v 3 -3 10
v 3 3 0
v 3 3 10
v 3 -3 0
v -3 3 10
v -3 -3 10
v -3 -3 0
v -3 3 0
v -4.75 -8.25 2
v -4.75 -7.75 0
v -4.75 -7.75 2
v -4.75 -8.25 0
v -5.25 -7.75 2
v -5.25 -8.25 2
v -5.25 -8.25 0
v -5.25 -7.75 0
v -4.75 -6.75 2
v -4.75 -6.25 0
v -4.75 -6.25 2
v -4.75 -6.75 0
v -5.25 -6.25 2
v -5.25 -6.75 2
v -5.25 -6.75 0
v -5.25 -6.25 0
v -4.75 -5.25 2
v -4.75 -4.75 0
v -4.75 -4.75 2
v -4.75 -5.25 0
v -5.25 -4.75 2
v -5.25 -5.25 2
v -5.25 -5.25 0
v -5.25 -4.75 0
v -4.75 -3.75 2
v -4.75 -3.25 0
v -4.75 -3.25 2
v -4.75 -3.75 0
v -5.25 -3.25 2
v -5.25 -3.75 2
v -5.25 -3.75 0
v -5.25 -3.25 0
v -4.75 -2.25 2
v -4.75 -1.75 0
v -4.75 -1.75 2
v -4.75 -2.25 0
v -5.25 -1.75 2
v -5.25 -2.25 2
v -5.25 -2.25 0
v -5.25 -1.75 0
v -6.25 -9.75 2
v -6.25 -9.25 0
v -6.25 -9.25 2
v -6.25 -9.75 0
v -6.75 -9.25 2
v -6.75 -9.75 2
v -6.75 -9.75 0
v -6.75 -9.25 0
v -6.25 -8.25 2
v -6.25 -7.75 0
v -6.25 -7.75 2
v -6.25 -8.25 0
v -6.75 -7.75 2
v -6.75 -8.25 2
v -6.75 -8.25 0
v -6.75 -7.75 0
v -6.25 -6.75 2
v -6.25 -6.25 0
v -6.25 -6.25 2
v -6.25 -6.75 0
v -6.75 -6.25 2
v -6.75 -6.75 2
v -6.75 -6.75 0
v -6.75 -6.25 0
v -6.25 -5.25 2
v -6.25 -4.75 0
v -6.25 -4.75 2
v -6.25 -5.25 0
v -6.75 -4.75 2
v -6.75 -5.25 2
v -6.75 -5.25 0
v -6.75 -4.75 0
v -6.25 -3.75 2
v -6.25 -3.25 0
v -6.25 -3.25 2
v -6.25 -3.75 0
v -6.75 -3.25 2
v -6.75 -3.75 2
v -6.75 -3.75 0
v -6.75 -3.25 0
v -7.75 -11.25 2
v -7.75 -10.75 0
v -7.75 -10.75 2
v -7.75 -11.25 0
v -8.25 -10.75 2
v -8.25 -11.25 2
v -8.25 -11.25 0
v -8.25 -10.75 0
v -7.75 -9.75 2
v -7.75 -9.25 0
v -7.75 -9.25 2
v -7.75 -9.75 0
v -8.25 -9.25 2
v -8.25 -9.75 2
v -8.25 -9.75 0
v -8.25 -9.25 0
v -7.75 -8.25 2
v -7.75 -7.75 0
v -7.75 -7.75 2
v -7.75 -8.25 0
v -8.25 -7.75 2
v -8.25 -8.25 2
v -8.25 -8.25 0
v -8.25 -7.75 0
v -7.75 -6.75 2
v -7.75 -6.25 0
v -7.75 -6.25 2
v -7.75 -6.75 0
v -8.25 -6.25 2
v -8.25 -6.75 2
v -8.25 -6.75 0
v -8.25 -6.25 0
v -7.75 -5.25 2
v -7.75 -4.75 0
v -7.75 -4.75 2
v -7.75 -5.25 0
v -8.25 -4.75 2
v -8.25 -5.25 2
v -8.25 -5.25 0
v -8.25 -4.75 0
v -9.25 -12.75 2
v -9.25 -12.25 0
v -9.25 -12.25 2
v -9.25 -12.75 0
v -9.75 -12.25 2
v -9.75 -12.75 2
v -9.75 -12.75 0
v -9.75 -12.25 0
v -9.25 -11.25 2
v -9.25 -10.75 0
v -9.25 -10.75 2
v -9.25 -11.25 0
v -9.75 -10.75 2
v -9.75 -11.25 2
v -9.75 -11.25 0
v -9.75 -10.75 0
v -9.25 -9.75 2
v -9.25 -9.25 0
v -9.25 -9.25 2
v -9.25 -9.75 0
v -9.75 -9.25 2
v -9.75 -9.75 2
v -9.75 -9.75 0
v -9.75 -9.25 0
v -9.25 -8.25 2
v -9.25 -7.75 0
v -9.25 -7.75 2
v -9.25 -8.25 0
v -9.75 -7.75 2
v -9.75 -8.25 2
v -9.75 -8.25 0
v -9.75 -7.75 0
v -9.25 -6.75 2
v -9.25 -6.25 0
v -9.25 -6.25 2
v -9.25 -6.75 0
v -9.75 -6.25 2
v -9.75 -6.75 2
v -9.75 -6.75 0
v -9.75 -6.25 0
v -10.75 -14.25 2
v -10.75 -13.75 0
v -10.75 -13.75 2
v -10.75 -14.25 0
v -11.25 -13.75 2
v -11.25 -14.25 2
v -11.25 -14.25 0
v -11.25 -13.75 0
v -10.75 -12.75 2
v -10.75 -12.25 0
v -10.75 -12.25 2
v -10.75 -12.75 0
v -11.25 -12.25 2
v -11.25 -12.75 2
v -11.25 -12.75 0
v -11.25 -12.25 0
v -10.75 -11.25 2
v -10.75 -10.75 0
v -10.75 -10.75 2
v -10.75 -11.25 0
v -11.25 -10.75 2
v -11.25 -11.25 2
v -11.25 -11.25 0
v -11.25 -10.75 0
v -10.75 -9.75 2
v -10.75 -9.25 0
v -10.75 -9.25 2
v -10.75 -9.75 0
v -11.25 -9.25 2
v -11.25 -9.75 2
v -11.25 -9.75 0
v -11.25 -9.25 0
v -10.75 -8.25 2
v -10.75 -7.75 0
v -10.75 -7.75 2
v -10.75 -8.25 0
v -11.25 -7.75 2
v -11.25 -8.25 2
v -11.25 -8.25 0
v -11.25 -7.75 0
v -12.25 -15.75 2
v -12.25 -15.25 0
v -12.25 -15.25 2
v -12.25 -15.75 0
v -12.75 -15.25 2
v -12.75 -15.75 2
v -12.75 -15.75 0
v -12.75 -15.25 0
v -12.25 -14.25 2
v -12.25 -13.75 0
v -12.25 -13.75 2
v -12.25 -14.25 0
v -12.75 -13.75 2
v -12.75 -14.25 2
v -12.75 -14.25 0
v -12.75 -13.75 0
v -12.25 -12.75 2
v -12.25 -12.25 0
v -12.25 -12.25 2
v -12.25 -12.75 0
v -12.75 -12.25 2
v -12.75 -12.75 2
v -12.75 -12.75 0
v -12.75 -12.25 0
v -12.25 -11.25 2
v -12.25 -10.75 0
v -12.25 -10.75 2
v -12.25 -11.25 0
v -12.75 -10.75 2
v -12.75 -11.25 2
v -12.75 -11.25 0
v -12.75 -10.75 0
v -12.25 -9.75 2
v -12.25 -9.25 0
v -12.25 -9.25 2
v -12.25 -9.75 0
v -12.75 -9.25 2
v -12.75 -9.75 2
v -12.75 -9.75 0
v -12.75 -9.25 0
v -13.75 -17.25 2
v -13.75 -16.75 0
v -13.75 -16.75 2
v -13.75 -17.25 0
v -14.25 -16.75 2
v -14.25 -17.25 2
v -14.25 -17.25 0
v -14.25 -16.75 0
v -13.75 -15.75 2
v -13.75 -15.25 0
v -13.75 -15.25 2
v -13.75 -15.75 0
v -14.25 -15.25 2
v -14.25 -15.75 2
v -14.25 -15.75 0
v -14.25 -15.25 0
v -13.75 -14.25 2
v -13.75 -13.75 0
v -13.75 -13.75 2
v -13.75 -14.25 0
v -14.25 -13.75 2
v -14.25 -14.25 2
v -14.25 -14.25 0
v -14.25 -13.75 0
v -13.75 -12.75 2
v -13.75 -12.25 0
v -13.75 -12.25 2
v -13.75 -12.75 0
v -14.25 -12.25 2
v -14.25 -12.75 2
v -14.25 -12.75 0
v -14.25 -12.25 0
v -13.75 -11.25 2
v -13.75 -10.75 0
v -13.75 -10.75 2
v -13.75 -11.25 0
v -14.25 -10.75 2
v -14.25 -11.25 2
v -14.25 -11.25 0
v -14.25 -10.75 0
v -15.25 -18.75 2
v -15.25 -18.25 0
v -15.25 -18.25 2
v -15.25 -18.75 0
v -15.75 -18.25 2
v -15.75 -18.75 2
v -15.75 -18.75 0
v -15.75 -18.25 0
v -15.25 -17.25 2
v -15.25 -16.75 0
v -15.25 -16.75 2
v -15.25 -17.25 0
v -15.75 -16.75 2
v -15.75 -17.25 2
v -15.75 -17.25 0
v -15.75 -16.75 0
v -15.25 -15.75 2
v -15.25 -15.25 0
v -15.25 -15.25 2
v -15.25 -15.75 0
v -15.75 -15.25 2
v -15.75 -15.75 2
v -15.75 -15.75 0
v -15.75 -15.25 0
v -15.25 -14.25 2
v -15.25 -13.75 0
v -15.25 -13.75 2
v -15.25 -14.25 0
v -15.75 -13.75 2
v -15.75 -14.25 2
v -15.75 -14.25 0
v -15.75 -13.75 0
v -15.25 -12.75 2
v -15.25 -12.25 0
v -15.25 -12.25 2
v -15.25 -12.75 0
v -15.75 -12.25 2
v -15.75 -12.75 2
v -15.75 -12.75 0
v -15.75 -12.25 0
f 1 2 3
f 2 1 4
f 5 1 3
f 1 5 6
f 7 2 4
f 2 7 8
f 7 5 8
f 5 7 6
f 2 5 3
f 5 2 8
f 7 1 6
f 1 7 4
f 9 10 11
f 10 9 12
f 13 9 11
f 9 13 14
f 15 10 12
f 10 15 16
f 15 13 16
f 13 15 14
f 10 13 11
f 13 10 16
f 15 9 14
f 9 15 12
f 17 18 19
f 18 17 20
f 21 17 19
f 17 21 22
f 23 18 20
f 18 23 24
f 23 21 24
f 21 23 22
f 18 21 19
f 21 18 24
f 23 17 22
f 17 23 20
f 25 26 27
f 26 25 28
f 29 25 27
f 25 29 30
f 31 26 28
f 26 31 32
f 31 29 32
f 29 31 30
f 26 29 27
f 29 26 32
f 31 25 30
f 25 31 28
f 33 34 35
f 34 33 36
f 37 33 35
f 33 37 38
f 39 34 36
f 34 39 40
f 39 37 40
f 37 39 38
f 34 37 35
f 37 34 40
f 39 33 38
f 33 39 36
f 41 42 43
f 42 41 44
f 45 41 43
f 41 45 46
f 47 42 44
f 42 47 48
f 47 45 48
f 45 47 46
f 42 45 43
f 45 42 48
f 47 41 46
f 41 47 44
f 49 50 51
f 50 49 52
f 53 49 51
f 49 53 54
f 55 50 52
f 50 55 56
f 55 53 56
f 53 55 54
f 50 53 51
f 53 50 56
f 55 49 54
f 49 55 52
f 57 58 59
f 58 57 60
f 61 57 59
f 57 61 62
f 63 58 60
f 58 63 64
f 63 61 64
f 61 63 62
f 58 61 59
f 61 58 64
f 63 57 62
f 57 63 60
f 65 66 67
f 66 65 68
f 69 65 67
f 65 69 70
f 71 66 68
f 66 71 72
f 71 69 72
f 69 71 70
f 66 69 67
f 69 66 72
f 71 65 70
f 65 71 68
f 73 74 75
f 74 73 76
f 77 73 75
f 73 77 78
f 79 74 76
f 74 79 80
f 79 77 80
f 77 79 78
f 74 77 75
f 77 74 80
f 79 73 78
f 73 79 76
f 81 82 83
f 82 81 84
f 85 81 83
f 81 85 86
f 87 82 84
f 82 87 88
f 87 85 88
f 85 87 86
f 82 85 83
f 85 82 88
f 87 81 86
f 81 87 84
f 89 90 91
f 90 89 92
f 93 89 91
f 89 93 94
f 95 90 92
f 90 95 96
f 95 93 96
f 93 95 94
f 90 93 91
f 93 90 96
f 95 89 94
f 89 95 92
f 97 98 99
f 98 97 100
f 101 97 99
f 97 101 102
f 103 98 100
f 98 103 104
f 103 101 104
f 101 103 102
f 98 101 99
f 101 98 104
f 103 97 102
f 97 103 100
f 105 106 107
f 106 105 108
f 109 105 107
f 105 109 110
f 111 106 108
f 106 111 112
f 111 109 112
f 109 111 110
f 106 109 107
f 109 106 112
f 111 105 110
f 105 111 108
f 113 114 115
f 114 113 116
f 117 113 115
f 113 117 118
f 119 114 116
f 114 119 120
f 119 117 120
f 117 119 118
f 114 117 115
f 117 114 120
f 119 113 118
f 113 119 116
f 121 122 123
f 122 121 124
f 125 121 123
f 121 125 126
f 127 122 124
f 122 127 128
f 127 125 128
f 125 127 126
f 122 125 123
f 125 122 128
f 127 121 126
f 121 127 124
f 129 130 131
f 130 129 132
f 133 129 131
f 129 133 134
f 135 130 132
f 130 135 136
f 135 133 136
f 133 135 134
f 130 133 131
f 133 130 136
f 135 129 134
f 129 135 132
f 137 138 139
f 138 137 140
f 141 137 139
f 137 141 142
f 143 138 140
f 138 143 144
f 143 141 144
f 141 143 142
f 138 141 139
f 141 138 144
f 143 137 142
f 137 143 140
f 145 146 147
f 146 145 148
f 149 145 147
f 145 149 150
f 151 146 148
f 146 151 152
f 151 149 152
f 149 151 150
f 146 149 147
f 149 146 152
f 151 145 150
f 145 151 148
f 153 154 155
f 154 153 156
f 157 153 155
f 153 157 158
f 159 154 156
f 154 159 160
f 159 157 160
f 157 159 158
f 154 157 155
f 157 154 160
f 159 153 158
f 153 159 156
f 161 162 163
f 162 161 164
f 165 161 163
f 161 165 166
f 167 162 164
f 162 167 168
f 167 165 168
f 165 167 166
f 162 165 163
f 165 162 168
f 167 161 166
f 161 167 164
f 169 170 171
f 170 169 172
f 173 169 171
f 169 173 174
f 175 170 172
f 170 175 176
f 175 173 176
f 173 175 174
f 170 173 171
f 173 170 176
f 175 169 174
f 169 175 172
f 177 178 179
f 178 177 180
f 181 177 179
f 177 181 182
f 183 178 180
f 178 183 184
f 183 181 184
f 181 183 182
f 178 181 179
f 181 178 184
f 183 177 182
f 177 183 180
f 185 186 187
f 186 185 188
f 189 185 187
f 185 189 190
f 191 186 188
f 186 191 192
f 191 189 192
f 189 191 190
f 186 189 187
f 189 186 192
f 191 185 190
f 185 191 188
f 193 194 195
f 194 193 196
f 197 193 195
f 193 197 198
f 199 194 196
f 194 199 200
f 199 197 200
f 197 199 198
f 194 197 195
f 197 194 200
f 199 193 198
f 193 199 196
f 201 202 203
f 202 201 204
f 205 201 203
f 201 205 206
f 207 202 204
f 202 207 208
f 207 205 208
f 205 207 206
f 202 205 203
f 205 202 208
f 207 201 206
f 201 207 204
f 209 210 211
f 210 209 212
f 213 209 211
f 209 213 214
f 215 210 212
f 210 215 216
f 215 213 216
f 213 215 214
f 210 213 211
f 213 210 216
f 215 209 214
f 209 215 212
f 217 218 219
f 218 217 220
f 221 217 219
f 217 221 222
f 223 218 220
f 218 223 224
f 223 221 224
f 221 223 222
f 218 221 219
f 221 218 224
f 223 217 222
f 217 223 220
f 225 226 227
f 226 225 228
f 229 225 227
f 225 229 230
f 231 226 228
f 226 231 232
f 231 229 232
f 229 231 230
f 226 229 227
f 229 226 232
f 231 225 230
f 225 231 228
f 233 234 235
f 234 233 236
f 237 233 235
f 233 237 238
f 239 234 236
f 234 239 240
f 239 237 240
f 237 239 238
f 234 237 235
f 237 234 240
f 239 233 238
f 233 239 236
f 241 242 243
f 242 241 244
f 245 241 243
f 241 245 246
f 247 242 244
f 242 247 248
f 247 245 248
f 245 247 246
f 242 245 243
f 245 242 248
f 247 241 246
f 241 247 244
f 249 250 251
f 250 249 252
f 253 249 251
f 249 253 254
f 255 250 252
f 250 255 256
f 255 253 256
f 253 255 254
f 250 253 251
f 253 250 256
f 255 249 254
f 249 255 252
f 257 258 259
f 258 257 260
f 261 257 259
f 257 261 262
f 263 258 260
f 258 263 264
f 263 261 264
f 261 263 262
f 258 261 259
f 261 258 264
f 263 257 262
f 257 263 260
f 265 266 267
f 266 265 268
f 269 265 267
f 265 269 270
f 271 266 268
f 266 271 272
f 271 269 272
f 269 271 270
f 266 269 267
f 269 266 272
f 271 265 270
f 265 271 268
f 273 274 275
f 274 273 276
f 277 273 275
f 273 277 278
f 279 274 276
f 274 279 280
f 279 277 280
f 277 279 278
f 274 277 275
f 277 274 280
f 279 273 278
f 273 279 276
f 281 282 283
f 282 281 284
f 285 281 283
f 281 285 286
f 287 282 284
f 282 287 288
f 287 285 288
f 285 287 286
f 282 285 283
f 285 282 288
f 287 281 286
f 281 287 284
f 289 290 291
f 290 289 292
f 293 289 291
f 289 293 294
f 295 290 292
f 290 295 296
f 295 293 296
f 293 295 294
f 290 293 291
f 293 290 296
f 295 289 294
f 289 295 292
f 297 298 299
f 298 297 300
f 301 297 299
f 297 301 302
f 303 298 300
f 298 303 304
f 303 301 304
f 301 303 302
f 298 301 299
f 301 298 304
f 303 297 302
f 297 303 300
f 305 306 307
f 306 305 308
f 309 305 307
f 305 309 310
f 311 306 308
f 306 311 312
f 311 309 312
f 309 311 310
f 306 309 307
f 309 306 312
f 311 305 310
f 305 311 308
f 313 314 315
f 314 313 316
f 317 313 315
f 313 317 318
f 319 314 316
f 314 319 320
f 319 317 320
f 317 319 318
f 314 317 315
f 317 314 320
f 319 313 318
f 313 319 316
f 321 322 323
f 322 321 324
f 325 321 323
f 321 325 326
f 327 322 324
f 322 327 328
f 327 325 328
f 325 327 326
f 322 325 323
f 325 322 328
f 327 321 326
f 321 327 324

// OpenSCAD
translate([0, 0, 5]) color([0,1,0,0.9]) cube([6, 6, 10], center=true);
translate([-5.0, -8.0, 1]) color([1,0,0]) cube([0.5, 0.5, 2], center=true);
translate([-5.0, -6.5, 1]) color([1,0,0]) cube([0.5, 0.5, 2], center=true);
translate([-5.0, -5.0, 1]) color([1,0,0]) cube([0.5, 0.5, 2], center=true);
translate([-5.0, -3.5, 1]) color([1,0,0]) cube([0.5, 0.5, 2], center=true);
translate([-5.0, -2.0, 1]) color([1,0,0]) cube([0.5, 0.5, 2], center=true);
translate([-6.5, -9.5, 1]) color([1,0,0]) cube([0.5, 0.5, 2], center=true);
translate([-6.5, -8.0, 1]) color([1,0,0]) cube([0.5, 0.5, 2], center=true);
translate([-6.5, -6.5, 1]) color([1,0,0]) cube([0.5, 0.5, 2], center=true);
translate([-6.5, -5.0, 1]) color([1,0,0]) cube([0.5, 0.5, 2], center=true);
translate([-6.5, -3.5, 1]) color([1,0,0]) cube([0.5, 0.5, 2], center=true);
translate([-8.0, -11.0, 1]) color([1,0,0]) cube([0.5, 0.5, 2], center=true);
translate([-8.0, -9.5, 1]) color([1,0,0]) cube([0.5, 0.5, 2], center=true);
translate([-8.0, -8.0, 1]) color([1,0,0]) cube([0.5, 0.5, 2], center=true);
translate([-8.0, -6.5, 1]) color([1,0,0]) cube([0.5, 0.5, 2], center=true);
translate([-8.0, -5.0, 1]) color([1,0,0]) cube([0.5, 0.5, 2], center=true);
translate([-9.5, -12.5, 1]) color([1,0,0]) cube([0.5, 0.5, 2], center=true);
translate([-9.5, -11.0, 1]) color([1,0,0]) cube([0.5, 0.5, 2], center=true);
translate([-9.5, -9.5, 1]) color([1,0,0]) cube([0.5, 0.5, 2], center=true);
translate([-9.5, -8.0, 1]) color([1,0,0]) cube([0.5, 0.5, 2], center=true);
translate([-9.5, -6.5, 1]) color([1,0,0]) cube([0.5, 0.5, 2], center=true);
translate([-11.0, -14.0, 1]) color([1,0,0]) cube([0.5, 0.5, 2], center=true);
translate([-11.0, -12.5, 1]) color([1,0,0]) cube([0.5, 0.5, 2], center=true);
translate([-11.0, -11.0, 1]) color([1,0,0]) cube([0.5, 0.5, 2], center=true);
translate([-11.0, -9.5, 1]) color([1,0,0]) cube([0.5, 0.5, 2], center=true);
translate([-11.0, -8.0, 1]) color([1,0,0]) cube([0.5, 0.5, 2], center=true);
translate([-12.5, -15.5, 1]) color([1,0,0]) cube([0.5, 0.5, 2], center=true);
translate([-12.5, -14.0, 1]) color([1,0,0]) cube([0.5, 0.5, 2], center=true);
translate([-12.5, -12.5, 1]) color([1,0,0]) cube([0.5, 0.5, 2], center=true);
translate([-12.5, -11.0, 1]) color([1,0,0]) cube([0.5, 0.5, 2], center=true);
translate([-12.5, -9.5, 1]) color([1,0,0]) cube([0.5, 0.5, 2], center=true);
translate([-14.0, -17.0, 1]) color([1,0,0]) cube([0.5, 0.5, 2], center=true);
translate([-14.0, -15.5, 1]) color([1,0,0]) cube([0.5, 0.5, 2], center=true);
translate([-14.0, -14.0, 1]) color([1,0,0]) cube([0.5, 0.5, 2], center=true);
translate([-14.0, -12.5, 1]) color([1,0,0]) cube([0.5, 0.5, 2], center=true);
translate([-14.0, -11.0, 1]) color([1,0,0]) cube([0.5, 0.5, 2], center=true);
translate([-15.5, -18.5, 1]) color([1,0,0]) cube([0.5, 0.5, 2], center=true);
translate([-15.5, -17.0, 1]) color([1,0,0]) cube([0.5, 0.5, 2], center=true);
translate([-15.5, -15.5, 1]) color([1,0,0]) cube([0.5, 0.5, 2], center=true);
translate([-15.5, -14.0, 1]) color([1,0,0]) cube([0.5, 0.5, 2], center=true);
translate([-15.5, -12.5, 1]) color([1,0,0]) cube([0.5, 0.5, 2], center=true);
